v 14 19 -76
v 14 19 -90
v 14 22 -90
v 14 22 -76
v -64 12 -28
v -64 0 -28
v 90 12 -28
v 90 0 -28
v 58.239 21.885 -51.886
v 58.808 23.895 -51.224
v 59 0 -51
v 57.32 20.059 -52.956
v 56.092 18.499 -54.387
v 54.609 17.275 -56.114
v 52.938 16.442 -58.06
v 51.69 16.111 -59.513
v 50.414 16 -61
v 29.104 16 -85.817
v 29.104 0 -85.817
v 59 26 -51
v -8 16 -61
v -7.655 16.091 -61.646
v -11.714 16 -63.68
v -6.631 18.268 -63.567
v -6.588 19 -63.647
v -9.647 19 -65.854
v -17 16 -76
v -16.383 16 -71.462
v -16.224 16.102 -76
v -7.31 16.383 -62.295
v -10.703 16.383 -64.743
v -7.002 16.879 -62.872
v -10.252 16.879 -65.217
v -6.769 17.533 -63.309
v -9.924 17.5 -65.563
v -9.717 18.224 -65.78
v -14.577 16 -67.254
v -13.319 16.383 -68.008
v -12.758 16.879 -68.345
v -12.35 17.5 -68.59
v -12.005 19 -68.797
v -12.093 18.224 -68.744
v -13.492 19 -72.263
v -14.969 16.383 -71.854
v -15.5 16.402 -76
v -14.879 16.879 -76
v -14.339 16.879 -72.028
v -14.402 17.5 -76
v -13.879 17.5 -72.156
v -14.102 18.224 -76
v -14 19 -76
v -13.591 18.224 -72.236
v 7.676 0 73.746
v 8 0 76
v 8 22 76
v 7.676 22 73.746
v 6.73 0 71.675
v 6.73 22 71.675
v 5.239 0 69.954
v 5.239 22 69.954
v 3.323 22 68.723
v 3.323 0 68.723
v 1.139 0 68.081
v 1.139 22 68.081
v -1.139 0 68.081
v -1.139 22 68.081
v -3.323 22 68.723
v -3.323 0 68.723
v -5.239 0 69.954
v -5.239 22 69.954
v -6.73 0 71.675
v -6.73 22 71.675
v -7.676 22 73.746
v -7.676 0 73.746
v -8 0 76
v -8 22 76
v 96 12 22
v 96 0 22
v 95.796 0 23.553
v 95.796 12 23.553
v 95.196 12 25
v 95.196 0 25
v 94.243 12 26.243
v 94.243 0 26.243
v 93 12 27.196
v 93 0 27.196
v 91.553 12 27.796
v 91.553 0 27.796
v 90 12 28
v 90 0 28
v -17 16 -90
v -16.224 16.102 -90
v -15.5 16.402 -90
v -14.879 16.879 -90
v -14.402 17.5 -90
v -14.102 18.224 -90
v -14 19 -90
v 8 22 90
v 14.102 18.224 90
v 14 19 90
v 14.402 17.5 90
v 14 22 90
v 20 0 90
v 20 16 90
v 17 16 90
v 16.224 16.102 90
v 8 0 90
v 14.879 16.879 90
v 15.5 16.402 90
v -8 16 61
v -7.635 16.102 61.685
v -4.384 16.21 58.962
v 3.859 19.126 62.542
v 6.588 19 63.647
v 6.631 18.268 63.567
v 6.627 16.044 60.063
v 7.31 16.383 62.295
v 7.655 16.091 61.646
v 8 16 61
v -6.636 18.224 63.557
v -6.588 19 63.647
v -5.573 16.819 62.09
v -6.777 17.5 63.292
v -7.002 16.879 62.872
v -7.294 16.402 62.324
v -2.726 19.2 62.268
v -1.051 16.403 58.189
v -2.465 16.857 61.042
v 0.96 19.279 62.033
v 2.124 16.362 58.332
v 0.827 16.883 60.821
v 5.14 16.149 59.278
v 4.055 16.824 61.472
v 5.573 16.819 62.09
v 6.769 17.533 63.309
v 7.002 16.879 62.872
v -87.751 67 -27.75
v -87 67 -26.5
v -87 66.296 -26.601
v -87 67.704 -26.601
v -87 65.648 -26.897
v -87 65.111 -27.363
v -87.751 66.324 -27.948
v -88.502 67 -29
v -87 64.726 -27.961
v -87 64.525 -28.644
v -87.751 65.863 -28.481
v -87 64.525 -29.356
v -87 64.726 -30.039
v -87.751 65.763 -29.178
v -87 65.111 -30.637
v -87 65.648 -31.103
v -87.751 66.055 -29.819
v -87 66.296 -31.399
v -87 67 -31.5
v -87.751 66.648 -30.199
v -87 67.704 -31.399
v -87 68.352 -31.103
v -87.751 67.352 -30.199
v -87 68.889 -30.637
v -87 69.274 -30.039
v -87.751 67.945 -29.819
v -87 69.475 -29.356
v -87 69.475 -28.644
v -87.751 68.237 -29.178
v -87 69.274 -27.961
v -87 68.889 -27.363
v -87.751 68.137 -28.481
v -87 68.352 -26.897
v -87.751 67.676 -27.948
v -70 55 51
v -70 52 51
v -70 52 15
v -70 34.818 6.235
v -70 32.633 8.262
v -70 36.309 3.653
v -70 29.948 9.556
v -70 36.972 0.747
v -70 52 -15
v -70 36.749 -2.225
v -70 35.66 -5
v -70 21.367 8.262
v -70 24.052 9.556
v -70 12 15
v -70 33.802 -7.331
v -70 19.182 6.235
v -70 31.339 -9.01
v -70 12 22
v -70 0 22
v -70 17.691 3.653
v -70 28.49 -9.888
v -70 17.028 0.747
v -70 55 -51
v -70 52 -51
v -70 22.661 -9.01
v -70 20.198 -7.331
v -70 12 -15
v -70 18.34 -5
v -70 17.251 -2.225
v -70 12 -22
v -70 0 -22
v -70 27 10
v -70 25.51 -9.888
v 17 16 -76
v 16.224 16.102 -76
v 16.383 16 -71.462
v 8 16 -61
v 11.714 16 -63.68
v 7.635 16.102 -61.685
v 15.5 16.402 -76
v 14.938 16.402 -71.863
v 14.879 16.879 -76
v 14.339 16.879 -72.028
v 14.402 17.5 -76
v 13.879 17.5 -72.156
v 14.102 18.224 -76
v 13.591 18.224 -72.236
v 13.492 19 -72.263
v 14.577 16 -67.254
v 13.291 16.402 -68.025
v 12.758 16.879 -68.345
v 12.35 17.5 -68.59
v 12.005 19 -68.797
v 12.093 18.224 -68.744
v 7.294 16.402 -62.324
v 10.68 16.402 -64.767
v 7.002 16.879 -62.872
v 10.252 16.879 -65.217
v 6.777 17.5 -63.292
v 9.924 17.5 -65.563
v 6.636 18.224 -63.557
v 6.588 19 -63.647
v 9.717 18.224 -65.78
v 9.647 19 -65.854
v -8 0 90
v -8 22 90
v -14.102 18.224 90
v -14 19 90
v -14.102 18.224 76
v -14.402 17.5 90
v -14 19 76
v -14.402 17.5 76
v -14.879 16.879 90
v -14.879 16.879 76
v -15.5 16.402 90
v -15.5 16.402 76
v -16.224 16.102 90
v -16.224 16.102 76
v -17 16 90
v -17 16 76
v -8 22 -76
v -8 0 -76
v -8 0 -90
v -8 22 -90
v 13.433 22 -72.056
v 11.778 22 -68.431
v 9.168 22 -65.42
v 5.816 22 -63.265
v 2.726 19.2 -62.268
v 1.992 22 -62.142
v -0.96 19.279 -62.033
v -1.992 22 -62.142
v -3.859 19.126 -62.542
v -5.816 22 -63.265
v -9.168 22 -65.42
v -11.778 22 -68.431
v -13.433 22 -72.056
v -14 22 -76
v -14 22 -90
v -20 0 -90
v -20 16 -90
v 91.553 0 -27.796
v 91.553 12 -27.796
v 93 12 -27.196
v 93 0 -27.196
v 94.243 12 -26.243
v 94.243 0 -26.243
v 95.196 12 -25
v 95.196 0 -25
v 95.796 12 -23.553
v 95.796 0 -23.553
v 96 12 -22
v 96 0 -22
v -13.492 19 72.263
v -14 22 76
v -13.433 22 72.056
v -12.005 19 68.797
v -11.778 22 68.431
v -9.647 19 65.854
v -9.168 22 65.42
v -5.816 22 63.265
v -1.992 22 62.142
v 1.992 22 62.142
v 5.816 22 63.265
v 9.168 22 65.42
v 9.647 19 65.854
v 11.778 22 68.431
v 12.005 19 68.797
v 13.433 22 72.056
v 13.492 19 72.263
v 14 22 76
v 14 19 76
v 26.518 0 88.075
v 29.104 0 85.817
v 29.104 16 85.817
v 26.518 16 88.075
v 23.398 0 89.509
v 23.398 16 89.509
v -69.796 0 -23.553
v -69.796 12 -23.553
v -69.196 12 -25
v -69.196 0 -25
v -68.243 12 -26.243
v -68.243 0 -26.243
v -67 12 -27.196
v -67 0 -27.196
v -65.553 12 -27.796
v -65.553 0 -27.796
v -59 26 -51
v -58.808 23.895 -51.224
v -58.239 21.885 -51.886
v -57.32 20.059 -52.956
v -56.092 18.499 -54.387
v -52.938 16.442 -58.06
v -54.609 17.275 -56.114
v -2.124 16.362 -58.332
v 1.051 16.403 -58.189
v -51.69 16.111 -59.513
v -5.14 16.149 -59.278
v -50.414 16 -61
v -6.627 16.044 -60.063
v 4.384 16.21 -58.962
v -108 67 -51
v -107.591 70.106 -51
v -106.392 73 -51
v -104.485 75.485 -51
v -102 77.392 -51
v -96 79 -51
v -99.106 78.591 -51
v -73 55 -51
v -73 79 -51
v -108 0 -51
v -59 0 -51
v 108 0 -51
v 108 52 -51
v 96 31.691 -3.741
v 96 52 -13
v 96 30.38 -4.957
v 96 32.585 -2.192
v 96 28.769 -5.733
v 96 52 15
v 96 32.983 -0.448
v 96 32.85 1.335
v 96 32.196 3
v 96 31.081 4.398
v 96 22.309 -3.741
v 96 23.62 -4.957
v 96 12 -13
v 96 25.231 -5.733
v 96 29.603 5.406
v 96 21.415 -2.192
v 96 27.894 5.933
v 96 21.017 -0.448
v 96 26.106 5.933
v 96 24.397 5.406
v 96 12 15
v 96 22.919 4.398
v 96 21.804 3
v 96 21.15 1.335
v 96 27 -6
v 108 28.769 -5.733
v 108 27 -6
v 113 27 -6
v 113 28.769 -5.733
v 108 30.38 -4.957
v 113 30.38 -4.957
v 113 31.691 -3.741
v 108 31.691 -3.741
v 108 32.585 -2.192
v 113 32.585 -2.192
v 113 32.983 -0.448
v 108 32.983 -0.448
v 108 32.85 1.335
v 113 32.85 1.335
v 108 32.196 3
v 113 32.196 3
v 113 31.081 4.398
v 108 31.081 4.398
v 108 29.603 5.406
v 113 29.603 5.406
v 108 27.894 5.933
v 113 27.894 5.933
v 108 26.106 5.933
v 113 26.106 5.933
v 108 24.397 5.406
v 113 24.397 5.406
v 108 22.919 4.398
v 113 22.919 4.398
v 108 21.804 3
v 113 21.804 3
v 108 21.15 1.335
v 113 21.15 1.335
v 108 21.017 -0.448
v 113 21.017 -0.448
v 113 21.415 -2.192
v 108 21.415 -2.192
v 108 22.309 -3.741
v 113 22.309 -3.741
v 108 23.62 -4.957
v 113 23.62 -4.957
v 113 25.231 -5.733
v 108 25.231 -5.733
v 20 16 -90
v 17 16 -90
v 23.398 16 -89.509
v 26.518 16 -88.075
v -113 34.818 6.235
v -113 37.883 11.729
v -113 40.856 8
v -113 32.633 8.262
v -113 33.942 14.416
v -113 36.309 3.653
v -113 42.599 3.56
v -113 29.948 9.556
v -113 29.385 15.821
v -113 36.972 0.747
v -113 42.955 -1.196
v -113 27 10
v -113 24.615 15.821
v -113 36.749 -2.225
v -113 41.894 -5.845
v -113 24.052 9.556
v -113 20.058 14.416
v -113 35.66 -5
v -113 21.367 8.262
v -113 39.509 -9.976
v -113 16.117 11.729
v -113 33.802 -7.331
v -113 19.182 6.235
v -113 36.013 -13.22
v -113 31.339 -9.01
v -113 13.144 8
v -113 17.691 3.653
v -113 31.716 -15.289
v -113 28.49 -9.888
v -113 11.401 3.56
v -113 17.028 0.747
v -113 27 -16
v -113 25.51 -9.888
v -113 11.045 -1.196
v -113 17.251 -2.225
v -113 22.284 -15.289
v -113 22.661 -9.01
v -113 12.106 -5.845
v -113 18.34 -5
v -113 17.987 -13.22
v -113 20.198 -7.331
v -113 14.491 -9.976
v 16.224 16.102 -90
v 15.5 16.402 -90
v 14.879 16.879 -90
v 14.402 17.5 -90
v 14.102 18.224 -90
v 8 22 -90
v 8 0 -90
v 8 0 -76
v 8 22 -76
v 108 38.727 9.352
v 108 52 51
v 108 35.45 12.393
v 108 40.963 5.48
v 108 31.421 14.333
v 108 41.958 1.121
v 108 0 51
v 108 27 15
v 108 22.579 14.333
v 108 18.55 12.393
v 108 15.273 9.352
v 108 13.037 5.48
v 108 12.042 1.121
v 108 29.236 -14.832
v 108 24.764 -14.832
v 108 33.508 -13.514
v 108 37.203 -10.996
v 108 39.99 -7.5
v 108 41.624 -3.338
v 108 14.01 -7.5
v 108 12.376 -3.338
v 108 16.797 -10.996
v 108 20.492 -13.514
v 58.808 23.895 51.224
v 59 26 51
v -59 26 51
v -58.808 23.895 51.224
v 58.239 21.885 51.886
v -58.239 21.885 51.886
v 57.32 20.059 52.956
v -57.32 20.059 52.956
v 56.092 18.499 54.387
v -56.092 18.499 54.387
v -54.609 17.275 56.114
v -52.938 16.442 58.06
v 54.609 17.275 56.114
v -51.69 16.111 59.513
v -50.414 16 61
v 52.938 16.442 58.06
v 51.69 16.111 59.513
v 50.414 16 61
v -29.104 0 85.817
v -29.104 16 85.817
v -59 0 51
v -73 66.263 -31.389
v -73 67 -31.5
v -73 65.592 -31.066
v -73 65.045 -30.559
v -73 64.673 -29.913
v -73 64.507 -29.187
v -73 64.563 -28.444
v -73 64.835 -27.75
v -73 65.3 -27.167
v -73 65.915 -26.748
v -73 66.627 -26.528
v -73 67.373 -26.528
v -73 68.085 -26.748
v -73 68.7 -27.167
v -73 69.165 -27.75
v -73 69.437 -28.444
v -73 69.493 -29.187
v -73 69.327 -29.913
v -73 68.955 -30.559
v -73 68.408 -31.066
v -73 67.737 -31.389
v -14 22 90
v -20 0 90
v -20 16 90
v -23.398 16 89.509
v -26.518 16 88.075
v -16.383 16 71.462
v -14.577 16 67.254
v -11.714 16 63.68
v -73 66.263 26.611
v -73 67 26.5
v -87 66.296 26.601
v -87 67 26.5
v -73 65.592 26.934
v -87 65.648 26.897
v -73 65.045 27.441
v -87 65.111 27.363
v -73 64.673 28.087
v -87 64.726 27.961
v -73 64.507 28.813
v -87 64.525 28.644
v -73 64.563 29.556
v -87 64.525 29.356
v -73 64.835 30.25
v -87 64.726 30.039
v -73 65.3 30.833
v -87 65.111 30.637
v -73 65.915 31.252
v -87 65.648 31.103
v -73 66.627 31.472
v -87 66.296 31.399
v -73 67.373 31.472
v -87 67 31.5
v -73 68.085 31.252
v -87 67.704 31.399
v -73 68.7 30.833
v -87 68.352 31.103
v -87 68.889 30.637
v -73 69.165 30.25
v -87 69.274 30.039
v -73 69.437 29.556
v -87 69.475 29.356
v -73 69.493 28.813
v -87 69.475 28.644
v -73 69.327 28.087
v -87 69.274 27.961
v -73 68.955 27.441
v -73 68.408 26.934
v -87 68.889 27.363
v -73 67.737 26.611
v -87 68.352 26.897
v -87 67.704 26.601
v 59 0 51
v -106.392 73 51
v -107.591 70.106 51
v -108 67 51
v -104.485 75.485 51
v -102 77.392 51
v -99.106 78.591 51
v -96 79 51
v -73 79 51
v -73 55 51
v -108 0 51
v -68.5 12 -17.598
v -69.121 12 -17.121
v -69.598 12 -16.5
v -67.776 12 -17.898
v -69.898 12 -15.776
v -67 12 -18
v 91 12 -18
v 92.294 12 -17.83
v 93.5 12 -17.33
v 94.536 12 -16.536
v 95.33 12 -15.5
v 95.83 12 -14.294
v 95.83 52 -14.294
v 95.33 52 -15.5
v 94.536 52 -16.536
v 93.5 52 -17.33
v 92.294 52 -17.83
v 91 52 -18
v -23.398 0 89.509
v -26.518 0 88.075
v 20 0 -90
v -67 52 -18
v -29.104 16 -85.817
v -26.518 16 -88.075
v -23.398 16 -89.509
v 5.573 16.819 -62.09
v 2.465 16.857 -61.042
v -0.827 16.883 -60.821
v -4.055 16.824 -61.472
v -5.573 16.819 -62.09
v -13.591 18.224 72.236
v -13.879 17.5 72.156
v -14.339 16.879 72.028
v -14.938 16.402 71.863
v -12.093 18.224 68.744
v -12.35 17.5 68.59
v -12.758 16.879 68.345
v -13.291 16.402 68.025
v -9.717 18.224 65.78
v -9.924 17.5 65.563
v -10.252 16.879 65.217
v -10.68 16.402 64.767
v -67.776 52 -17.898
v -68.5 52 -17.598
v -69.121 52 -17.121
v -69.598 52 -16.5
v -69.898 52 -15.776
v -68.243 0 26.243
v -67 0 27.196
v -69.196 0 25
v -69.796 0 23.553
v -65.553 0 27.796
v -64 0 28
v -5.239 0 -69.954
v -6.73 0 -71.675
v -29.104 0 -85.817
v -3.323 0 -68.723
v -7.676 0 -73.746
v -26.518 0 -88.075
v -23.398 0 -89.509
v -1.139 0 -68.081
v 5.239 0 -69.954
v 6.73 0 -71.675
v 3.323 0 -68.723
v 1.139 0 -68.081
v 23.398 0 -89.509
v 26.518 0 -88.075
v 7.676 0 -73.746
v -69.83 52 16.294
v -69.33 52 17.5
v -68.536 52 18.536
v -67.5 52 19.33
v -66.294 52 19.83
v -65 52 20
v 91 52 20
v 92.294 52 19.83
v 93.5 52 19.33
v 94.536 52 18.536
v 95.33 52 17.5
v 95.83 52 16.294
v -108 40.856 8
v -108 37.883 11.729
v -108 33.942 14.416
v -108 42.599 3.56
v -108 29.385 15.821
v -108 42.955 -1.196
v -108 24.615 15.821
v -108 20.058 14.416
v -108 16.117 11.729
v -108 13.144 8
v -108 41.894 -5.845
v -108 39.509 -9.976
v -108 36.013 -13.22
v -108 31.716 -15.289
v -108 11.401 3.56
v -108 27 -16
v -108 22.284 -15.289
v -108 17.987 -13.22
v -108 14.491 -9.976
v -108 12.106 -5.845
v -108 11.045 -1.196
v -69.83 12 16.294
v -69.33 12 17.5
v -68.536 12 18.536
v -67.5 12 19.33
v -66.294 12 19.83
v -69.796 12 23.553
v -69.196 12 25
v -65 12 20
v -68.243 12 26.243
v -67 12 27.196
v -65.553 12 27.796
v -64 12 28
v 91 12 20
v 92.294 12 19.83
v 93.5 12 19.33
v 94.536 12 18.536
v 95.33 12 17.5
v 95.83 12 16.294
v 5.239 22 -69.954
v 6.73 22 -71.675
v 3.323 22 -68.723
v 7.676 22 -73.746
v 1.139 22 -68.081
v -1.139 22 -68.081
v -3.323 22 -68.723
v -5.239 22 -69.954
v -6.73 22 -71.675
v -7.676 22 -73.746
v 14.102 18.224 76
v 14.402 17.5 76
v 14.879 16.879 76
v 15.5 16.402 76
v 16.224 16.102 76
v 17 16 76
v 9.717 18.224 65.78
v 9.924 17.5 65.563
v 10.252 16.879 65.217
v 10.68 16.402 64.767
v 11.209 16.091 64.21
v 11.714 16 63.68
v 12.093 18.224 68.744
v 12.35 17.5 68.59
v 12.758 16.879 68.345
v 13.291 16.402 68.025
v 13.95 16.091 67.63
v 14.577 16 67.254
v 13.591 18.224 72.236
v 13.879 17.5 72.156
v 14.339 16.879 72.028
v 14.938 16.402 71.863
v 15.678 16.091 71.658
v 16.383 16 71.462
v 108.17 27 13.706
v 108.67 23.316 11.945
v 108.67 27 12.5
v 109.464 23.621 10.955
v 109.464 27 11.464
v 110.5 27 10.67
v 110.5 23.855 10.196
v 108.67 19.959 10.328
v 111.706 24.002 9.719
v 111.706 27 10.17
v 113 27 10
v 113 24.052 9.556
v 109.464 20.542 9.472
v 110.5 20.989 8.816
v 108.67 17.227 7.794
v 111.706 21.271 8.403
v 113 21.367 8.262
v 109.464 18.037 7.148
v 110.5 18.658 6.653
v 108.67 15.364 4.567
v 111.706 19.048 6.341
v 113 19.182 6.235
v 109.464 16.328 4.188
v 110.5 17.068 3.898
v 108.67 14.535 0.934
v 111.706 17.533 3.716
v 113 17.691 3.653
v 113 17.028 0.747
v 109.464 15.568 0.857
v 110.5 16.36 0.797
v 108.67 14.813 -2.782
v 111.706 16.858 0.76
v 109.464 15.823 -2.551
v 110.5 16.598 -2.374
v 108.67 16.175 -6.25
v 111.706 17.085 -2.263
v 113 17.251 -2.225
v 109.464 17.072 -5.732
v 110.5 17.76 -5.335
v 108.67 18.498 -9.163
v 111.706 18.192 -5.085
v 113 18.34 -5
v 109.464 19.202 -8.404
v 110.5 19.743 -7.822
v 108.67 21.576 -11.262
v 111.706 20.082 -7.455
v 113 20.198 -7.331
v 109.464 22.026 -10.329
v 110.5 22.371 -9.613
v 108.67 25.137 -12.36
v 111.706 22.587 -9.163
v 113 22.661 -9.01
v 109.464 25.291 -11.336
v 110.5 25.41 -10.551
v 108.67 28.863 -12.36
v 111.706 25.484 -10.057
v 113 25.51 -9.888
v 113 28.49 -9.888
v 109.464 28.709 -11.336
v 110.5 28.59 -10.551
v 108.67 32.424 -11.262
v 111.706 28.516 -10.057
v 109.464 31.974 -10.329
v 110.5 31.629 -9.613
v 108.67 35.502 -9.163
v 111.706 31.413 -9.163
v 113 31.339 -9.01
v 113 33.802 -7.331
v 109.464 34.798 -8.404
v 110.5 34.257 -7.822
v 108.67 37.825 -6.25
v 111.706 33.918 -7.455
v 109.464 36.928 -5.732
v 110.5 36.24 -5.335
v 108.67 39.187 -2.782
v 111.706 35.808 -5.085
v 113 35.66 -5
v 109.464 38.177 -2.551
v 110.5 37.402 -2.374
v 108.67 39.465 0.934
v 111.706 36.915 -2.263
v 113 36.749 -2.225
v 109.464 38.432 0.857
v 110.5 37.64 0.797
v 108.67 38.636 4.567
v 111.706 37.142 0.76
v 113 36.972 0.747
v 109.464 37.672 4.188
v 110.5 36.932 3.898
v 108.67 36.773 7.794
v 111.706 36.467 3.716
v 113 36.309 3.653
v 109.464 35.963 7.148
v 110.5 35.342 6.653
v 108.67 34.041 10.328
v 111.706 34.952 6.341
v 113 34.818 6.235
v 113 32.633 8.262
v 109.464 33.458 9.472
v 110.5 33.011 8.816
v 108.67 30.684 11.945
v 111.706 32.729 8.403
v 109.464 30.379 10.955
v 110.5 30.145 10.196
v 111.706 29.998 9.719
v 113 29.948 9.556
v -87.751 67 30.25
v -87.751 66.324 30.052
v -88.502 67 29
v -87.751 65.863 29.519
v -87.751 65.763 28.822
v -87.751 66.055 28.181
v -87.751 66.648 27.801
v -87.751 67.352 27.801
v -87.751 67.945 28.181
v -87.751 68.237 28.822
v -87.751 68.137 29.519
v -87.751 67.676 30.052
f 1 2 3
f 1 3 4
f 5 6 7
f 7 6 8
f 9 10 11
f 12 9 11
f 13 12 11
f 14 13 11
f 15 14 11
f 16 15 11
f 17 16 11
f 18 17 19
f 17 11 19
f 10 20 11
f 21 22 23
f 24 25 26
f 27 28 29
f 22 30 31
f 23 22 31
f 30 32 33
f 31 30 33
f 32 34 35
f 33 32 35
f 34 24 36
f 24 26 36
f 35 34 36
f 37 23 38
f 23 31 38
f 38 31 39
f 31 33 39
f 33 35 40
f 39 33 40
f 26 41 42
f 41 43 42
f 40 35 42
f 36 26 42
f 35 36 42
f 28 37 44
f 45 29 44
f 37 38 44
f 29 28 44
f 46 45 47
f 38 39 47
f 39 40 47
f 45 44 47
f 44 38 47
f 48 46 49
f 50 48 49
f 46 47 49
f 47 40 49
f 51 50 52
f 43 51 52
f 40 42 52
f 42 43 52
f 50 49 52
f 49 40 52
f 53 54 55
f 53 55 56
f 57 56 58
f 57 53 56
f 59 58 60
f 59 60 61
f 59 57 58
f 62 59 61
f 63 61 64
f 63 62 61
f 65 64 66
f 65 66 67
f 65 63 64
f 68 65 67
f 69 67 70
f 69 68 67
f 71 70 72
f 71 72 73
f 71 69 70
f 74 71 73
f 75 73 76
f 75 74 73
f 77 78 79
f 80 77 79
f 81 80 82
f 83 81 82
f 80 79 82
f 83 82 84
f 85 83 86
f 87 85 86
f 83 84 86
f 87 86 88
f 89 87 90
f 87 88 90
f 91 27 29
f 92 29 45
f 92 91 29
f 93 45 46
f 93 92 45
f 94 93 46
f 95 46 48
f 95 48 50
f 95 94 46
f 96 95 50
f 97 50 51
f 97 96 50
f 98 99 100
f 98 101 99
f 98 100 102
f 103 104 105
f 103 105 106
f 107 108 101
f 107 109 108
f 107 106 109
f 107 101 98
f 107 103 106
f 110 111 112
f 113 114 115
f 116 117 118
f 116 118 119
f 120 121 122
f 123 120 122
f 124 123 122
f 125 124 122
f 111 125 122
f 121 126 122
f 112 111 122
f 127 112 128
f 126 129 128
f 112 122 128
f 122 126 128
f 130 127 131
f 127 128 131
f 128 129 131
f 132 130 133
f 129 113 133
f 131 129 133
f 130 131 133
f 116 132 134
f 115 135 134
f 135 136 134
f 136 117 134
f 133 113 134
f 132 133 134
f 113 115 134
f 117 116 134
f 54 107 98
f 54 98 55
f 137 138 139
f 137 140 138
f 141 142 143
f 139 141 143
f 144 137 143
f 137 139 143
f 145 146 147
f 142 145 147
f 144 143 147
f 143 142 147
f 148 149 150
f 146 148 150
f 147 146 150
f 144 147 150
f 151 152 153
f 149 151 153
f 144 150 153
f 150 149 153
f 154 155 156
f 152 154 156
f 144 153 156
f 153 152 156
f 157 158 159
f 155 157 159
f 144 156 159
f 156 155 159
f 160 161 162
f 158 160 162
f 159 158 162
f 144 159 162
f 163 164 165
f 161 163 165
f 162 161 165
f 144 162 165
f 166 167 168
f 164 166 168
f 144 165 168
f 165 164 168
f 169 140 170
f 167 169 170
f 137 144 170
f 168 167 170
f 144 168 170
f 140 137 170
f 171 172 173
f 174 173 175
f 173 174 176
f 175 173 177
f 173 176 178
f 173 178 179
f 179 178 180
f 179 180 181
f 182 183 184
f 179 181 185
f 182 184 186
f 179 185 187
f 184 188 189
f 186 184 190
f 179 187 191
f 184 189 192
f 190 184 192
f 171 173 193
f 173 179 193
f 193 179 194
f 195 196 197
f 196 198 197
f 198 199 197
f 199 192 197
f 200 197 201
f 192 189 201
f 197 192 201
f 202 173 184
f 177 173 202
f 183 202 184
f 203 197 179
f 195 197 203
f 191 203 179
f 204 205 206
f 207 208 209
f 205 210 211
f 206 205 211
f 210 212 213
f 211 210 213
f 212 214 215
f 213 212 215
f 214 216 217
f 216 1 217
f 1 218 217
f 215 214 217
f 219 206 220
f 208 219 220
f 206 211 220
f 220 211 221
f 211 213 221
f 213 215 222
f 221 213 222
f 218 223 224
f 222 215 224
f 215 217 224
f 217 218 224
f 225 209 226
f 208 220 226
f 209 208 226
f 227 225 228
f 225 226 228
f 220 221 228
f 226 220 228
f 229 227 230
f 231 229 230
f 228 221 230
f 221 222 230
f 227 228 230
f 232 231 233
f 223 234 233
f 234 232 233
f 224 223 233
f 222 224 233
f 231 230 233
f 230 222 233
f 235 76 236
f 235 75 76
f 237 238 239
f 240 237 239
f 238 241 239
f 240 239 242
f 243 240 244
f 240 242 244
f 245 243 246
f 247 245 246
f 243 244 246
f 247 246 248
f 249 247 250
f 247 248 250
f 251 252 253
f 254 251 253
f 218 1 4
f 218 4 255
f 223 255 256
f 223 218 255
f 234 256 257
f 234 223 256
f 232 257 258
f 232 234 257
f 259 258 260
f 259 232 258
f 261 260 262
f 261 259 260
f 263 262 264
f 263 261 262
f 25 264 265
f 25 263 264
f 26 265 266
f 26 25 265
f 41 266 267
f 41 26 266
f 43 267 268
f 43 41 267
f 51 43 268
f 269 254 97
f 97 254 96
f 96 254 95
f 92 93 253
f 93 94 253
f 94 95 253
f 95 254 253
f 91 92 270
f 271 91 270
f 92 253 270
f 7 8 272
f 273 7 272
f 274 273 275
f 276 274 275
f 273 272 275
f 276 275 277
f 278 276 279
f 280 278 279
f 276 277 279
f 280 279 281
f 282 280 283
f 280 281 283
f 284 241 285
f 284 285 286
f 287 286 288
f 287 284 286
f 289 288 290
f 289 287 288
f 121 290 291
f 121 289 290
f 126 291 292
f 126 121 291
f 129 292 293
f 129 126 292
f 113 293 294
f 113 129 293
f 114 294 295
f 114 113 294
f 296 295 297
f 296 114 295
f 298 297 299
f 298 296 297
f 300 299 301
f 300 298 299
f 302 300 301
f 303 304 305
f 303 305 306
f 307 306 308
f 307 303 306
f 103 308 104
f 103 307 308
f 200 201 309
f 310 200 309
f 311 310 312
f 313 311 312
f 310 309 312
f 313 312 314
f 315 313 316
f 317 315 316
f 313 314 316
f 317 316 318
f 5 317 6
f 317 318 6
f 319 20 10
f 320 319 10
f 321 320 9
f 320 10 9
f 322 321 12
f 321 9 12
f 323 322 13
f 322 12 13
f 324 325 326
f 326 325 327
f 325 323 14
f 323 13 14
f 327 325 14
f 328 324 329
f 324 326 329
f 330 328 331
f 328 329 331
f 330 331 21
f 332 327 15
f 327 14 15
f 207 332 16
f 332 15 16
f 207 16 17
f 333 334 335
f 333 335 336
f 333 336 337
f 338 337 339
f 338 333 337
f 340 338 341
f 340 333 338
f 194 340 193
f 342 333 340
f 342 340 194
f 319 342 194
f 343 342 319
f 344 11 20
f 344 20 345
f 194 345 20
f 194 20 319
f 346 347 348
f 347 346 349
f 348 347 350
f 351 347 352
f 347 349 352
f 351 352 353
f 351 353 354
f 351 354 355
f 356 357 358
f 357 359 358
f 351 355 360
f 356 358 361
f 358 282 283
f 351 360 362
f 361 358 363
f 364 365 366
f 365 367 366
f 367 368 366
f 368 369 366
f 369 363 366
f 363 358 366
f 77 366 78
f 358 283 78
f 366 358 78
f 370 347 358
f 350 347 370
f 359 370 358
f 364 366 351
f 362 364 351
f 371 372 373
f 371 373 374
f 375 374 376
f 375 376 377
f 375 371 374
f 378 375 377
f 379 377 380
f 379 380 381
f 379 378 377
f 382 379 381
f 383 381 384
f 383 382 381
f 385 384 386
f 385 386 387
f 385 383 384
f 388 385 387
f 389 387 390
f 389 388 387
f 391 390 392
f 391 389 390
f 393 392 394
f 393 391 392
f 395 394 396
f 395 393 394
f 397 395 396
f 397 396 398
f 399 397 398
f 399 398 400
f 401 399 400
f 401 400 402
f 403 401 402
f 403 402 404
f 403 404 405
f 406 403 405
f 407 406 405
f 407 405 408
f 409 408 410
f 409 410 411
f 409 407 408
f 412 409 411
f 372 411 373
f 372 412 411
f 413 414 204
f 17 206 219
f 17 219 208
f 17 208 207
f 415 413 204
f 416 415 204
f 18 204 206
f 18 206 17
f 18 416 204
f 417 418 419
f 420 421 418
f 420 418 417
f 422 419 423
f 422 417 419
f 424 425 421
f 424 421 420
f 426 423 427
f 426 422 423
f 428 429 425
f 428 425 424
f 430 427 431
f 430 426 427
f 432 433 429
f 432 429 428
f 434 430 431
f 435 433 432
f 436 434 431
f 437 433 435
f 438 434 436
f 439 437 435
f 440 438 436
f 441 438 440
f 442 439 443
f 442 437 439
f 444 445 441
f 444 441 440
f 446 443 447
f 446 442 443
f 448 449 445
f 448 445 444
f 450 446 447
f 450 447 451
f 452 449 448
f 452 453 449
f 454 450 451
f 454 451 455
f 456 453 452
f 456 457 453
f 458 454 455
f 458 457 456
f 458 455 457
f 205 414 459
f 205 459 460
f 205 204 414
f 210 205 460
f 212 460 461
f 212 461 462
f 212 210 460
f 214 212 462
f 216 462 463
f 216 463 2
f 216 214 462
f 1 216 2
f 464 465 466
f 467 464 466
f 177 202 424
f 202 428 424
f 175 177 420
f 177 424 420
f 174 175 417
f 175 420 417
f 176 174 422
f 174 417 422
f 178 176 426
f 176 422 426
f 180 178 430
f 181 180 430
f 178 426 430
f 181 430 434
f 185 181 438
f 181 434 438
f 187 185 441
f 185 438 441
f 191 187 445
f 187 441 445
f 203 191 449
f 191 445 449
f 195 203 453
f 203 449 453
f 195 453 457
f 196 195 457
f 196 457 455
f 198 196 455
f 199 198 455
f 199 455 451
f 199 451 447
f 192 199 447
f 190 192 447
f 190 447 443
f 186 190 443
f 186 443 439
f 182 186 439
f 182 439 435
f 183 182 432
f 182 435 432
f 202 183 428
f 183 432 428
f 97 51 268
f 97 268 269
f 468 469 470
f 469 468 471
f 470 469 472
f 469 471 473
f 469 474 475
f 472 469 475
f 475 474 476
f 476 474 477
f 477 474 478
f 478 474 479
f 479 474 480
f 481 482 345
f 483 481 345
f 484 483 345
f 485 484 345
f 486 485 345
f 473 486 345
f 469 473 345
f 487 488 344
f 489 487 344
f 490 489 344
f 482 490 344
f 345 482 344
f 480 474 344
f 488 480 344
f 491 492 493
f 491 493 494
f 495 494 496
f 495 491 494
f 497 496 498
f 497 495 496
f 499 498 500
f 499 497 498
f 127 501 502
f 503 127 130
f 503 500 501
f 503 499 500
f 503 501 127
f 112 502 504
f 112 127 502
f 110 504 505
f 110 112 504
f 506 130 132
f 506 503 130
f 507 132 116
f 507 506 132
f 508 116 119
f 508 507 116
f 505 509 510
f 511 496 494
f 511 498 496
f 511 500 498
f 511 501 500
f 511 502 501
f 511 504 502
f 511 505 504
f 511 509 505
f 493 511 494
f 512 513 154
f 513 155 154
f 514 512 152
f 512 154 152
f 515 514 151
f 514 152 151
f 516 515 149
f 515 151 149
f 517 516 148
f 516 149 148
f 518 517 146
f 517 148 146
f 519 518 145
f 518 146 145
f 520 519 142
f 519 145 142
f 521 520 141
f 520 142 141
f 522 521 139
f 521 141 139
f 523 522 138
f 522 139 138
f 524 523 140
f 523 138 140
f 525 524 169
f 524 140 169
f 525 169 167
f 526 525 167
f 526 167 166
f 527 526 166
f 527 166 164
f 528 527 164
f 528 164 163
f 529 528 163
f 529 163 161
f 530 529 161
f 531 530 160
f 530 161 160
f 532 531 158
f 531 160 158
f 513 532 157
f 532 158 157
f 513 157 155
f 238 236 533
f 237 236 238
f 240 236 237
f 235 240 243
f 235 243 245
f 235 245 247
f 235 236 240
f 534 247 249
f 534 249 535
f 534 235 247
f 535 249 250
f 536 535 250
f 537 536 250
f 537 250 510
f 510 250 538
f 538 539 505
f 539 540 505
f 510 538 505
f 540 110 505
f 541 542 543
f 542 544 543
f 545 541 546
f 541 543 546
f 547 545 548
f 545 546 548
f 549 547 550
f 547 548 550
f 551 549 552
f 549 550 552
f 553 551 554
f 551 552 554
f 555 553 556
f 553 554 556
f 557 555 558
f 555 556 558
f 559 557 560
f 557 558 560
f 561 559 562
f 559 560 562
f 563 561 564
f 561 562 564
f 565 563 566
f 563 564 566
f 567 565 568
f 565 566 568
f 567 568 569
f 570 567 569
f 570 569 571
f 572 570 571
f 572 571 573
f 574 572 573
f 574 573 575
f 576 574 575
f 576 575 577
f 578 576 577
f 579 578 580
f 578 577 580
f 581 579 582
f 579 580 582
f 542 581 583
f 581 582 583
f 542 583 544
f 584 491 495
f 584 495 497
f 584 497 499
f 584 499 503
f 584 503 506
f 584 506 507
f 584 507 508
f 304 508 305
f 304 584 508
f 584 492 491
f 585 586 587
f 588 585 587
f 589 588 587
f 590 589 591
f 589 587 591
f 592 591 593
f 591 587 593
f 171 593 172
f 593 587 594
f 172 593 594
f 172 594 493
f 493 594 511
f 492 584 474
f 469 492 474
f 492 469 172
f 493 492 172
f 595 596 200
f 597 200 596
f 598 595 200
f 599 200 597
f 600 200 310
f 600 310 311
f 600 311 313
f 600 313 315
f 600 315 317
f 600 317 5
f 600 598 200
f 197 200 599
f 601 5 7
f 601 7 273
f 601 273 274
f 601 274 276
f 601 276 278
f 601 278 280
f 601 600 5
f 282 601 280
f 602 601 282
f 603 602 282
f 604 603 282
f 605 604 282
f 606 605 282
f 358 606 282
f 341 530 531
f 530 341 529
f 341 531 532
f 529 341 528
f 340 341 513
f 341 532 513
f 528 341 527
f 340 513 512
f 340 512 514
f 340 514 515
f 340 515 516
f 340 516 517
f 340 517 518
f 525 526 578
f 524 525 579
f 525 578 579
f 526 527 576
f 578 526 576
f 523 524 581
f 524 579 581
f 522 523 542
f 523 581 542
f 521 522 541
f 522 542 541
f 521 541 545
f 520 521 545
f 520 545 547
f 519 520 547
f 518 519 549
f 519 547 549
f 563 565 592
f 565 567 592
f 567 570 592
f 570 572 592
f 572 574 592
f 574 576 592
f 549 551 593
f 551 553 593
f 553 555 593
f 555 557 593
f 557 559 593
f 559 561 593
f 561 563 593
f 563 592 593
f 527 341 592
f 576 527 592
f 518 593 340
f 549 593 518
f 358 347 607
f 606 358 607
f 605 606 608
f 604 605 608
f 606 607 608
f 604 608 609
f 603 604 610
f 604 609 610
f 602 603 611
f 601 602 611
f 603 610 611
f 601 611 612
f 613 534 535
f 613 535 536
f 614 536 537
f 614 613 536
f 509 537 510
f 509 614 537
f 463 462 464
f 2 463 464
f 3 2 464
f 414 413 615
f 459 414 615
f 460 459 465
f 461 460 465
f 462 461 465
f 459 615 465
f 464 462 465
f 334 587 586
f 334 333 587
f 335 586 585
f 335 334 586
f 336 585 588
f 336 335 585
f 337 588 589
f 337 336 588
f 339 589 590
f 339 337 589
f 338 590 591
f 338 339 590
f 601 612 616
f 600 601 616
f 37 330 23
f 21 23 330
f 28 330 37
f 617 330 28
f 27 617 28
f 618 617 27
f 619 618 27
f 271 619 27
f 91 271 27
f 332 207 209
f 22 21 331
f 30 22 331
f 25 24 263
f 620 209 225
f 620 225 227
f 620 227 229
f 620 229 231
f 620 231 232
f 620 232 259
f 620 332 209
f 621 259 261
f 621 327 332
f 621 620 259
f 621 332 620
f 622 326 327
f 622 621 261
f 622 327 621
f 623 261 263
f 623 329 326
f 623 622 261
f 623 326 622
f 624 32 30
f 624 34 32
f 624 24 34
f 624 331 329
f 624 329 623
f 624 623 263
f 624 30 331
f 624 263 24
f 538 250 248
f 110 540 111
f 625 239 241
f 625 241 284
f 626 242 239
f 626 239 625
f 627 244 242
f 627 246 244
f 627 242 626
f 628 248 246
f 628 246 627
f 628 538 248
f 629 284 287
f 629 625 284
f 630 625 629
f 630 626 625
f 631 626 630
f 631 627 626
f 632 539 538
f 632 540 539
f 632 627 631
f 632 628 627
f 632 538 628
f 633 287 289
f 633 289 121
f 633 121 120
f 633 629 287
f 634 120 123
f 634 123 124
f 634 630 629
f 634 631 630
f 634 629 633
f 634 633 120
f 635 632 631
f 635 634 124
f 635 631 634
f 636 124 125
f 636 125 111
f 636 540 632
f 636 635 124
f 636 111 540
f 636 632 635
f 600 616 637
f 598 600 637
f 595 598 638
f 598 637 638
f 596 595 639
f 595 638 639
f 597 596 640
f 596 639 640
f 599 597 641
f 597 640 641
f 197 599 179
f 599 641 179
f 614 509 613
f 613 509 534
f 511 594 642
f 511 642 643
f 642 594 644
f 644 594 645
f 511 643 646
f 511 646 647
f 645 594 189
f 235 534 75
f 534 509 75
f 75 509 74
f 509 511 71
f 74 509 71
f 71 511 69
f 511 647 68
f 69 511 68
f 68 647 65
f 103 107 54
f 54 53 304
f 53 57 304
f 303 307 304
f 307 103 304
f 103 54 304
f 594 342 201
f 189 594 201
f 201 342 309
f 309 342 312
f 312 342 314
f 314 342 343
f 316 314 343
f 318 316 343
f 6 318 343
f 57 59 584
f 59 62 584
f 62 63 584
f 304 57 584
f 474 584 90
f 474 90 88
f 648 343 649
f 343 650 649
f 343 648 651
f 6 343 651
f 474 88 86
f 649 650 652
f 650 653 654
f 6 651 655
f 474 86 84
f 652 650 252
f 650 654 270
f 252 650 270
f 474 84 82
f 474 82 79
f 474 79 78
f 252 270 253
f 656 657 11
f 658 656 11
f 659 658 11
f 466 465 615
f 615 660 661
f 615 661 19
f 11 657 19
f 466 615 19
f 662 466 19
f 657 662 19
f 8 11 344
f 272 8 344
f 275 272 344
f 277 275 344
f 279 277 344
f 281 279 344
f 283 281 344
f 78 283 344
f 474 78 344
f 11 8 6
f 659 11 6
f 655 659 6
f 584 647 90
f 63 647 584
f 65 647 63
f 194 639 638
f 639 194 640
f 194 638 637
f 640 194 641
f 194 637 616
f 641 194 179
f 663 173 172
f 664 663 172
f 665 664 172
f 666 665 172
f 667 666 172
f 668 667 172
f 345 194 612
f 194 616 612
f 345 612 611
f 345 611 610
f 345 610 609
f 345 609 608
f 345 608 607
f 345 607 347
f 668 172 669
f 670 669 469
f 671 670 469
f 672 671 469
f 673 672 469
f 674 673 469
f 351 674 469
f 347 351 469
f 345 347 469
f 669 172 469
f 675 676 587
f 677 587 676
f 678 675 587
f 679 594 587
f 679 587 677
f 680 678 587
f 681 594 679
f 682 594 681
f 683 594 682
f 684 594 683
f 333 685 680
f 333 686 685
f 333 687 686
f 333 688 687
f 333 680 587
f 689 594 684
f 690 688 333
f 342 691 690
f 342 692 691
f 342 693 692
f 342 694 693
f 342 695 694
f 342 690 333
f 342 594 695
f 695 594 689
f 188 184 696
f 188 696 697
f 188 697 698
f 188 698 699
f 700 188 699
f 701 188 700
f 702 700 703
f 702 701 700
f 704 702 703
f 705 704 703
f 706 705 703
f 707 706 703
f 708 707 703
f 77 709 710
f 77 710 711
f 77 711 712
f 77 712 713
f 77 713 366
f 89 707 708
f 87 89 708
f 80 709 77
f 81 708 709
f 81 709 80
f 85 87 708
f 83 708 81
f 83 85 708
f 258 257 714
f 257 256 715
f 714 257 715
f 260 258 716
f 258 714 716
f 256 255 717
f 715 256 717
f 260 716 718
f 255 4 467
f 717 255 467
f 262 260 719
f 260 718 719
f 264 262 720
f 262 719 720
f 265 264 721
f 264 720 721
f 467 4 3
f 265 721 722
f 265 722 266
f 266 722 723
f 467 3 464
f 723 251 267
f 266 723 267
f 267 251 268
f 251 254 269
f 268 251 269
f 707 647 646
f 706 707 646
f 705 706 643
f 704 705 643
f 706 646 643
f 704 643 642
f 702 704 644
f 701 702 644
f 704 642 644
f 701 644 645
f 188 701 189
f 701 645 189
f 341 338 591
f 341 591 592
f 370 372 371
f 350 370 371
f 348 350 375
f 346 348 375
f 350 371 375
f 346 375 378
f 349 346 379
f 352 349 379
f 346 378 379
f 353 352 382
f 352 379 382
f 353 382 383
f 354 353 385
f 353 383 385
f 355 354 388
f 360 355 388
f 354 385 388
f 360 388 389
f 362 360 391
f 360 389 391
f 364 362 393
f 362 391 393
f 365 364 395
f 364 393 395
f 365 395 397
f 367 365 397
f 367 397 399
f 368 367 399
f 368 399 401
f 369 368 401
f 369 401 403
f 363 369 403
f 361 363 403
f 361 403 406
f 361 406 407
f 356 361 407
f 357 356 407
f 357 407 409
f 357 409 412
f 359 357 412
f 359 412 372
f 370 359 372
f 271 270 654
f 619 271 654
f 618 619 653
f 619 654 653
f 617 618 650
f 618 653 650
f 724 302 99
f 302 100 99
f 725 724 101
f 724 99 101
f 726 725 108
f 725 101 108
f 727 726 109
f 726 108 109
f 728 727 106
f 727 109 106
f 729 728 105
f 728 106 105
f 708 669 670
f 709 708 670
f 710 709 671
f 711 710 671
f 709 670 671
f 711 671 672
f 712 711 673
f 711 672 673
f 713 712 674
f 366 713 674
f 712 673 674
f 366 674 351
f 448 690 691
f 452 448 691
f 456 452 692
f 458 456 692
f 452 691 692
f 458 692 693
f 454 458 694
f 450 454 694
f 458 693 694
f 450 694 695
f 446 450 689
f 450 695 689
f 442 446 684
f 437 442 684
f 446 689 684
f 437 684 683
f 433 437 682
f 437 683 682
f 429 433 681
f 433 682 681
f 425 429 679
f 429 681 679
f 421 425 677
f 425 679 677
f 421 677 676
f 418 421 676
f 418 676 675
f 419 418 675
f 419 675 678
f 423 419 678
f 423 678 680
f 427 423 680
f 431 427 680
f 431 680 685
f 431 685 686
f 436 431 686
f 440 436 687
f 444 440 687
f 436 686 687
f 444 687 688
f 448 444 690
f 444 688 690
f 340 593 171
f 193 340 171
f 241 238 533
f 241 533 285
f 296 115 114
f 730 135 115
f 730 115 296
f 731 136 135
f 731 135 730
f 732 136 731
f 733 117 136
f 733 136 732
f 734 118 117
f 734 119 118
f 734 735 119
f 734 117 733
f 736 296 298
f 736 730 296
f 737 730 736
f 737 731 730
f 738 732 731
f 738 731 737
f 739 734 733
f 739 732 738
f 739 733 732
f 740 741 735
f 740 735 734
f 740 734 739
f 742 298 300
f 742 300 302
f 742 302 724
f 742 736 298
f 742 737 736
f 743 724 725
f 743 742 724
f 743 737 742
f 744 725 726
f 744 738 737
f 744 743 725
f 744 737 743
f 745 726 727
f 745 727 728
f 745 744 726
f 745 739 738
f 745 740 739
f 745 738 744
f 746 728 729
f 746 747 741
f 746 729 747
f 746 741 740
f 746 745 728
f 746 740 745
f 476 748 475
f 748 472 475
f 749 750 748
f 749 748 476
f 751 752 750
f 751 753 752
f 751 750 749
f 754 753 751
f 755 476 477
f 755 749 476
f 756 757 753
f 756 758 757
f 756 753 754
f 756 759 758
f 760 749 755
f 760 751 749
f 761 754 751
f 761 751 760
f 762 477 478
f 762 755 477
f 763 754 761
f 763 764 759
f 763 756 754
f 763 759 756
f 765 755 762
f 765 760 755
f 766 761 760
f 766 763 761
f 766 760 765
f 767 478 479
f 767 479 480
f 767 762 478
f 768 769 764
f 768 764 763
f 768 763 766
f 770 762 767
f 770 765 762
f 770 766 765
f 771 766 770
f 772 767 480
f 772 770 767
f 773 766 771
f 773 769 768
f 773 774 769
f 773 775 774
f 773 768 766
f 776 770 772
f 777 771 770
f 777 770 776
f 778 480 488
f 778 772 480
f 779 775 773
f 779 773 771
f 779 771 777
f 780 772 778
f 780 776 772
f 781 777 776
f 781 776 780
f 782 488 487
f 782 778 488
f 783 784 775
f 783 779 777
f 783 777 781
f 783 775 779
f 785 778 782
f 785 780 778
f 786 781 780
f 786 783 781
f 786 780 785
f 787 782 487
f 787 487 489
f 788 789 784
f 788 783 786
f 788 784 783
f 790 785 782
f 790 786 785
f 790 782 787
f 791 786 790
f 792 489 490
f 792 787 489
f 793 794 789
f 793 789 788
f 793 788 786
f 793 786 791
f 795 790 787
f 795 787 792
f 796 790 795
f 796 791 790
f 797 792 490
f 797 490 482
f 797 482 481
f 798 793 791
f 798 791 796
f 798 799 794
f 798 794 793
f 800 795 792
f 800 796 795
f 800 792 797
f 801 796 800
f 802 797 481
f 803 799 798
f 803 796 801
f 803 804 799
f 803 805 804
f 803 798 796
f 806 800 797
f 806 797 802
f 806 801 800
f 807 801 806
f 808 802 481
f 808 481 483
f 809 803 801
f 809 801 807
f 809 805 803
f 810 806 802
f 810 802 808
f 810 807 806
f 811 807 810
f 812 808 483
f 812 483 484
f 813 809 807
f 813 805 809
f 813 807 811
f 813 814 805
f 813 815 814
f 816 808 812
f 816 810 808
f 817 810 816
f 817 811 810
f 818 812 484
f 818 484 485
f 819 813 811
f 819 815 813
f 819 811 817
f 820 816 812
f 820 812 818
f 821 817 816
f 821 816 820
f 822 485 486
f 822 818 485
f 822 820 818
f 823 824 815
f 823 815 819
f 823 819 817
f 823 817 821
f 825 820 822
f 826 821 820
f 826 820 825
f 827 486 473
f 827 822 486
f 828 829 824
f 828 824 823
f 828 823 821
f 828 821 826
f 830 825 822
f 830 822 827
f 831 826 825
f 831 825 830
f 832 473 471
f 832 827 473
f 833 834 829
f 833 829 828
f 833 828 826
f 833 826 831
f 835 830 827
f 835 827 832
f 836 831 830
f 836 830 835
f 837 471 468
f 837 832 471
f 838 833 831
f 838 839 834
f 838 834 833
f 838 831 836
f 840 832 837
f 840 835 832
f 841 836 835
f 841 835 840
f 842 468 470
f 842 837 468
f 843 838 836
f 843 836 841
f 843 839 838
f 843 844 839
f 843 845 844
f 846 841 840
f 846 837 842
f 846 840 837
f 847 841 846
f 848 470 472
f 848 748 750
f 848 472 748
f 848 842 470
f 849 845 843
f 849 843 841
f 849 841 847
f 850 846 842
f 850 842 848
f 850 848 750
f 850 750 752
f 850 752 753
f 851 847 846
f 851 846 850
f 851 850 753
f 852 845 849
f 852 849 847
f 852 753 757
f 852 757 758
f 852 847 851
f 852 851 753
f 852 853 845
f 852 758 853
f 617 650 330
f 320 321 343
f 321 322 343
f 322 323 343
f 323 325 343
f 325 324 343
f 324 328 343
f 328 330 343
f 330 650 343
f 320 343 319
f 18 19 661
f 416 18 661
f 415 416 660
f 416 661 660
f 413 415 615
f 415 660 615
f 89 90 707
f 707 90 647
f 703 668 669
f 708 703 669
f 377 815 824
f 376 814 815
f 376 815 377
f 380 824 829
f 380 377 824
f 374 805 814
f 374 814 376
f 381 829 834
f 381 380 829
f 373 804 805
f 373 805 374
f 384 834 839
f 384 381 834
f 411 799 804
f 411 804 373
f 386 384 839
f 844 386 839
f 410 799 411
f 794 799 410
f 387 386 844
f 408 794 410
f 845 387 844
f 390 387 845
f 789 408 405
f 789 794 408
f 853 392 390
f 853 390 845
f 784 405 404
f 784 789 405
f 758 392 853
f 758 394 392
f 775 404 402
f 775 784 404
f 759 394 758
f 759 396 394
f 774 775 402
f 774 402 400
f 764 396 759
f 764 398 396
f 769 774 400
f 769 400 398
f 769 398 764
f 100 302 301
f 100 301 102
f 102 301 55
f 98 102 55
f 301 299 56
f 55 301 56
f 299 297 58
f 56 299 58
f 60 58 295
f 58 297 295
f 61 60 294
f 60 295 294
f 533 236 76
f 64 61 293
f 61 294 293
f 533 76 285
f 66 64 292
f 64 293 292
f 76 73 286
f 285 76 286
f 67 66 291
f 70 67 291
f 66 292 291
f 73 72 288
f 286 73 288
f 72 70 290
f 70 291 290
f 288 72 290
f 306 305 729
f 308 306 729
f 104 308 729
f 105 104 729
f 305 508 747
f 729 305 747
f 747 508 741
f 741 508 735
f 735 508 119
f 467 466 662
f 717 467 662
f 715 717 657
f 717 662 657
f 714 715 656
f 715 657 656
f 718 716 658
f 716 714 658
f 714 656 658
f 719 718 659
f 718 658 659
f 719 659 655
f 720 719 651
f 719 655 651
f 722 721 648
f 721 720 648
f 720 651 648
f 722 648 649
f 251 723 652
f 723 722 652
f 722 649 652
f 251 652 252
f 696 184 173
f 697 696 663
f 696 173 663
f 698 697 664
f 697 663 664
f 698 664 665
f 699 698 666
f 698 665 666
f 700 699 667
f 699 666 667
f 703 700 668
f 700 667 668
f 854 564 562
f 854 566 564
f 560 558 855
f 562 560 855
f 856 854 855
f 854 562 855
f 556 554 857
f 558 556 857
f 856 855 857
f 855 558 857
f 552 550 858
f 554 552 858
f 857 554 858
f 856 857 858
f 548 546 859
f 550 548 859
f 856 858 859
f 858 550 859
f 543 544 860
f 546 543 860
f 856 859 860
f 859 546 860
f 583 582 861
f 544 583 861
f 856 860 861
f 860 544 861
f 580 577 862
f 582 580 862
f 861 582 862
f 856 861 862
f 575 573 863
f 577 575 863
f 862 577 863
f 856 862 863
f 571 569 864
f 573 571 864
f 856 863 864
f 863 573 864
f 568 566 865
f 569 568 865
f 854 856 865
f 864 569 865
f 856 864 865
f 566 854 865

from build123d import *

# Parameters (mm, degrees)
SKETCH1_W             = 216
SKETCH1_H             = 102
EXTRUDE1_DEPTH        = 79
EXTRUDE2_DEPTH        = 169.25278601
FILLET1_R             = 12
EXTRUDE3_DEPTH        = 131.265114286
EXTRUDE4_DEPTH        = 16
EXTRUDE5_DEPTH        = 6
FILLET3_R             = 10
FILLET4_R             = 3
FILLET5_R             = 10
FILLET6_R             = 3
M6_TAPPED_HOLE1_D     = 5
M6_TAPPED_HOLE1_DEPTH = 14
M6_TAPPED_HOLE1_TIP   = 1.502151548
SKETCH13_R            = 10
SKETCH13_R_2          = 6
EXTRUDE7_DEPTH        = 5
EXTRUDE8_REACH        = 248.976
SKETCH14_R            = 6
FILLET7_R             = 5
SKETCH15_R            = 16
EXTRUDE9_DEPTH        = 5
EXTRUDE10_REACH       = 257.767
SKETCH16_R            = 10
EXTRUDE11_DEPTH       = 12


with BuildPart() as part:
    # Sketch1 → Extrude1 (new body)
    with BuildSketch(Plane(origin=(0, 0, 0), x_dir=(1, 0, 0), z_dir=(0, 1, 0))):
        Rectangle(SKETCH1_W, SKETCH1_H)
    extrude(amount=EXTRUDE1_DEPTH)

    # Sketch2 → Extrude2 (cut, through all)
    with BuildSketch(Plane.XY.offset(51)):
        Polygon((-73, 79), (-73, 55), (-70, 55), (-70, 52), (108, 52), (108, 79), align=None)
    extrude(amount=-EXTRUDE2_DEPTH, mode=Mode.SUBTRACT)

    # Fillet1
    fillet1_edges = [part.edges().sort_by_distance(p)[0] for p in [
        (-108, 79, 0),
    ]]
    fillet(fillet1_edges, radius=FILLET1_R)

    # Sketch3 → Extrude3 (cut, through all)
    with BuildSketch(Plane(origin=(0, 52, 0), x_dir=(1, 0, 0), z_dir=(0, 1, 0))):
        with BuildLine():
            Line((-65, -20), (91, -20))
            ThreePointArc((91, -20), (94.535533906, -18.535533906), (96, -15))
            Line((96, -15), (96, 13))
            ThreePointArc((96, 13), (94.535533906, 16.535533906), (91, 18))
            Line((91, 18), (-67, 18))
            ThreePointArc((-67, 18), (-69.121320344, 17.121320344), (-70, 15))
            Line((-70, 15), (-70, -15))
            ThreePointArc((-70, -15), (-68.535533906, -18.535533906), (-65, -20))
        make_face()
    extrude(amount=-EXTRUDE3_DEPTH, mode=Mode.SUBTRACT)

    # Sketch4 → Extrude4 (add)
    with BuildSketch(Plane(origin=(0, 0, 0), x_dir=(1, 0, 0), z_dir=(0, 1, 0))):
        with BuildLine():
            Line((-8, 90), (-20, 90))
            ThreePointArc((-20, 90), (-25.00957212, 88.904319657), (-29.10432929, 85.817364529))
            Line((-29.10432929, 85.817364529), (-59, 51))
            Line((-59, 51), (59, 51))
            Line((59, 51), (29.10432929, 85.817364529))
            ThreePointArc((29.10432929, 85.817364529), (25.00957212, 88.904319657), (20, 90))
            Line((20, 90), (8, 90))
            Line((8, 90), (8, 76))
            ThreePointArc((8, 76), (0, 68), (-8, 76))
            Line((-8, 76), (-8, 90))
        make_face()
        with BuildLine():
            Line((8, -90), (8, -76))
            ThreePointArc((8, -76), (0, -68), (-8, -76))
            Line((-8, -76), (-8, -90))
            Line((-8, -90), (-20, -90))
            ThreePointArc((-20, -90), (-25.00957212, -88.904319657), (-29.10432929, -85.817364529))
            Line((-29.10432929, -85.817364529), (-59, -51))
            Line((-59, -51), (59, -51))
            Line((59, -51), (29.10432929, -85.817364529))
            ThreePointArc((29.10432929, -85.817364529), (25.00957212, -88.904319657), (20, -90))
            Line((20, -90), (8, -90))
        make_face()
    extrude(amount=EXTRUDE4_DEPTH)

    # Sketch5 → Extrude5 (add)
    with BuildSketch(Plane(origin=(0, 16, 0), x_dir=(1, 0, 0), z_dir=(0, 1, 0))):
        with BuildLine():
            Line((-14, -90), (-14, -76))
            ThreePointArc((-14, -76), (0, -62), (14, -76))
            Line((14, -76), (14, -90))
            Line((14, -90), (8, -90))
            Line((8, -90), (8, -76))
            ThreePointArc((8, -76), (0, -68), (-8, -76))
            Line((-8, -76), (-8, -90))
            Line((-8, -90), (-14, -90))
        make_face()
        with BuildLine():
            Line((14, 90), (14, 76))
            ThreePointArc((14, 76), (0, 62), (-14, 76))
            Line((-14, 76), (-14, 90))
            Line((-14, 90), (-8, 90))
            Line((-8, 90), (-8, 76))
            ThreePointArc((-8, 76), (0, 68), (8, 76))
            Line((8, 76), (8, 90))
            Line((8, 90), (14, 90))
        make_face()
    extrude(amount=EXTRUDE5_DEPTH)

    # Fillet3
    fillet3_edges = [part.edges().sort_by_distance(p)[0] for p in [
        (0, 16, 51),
    ]]
    fillet(fillet3_edges, radius=FILLET3_R)

    # Fillet4
    fillet4_edges = [part.edges().sort_by_distance(p)[0] for p in [
        (14, 16, 83),
        (0, 16, 62),
        (-14, 16, 83),
    ]]
    fillet(fillet4_edges, radius=FILLET4_R)

    # Fillet5
    fillet5_edges = [part.edges().sort_by_distance(p)[0] for p in [
        (0, 16, -51),
    ]]
    fillet(fillet5_edges, radius=FILLET5_R)

    # Fillet6
    fillet6_edges = [part.edges().sort_by_distance(p)[0] for p in [
        (0, 16, -62),
        (14, 16, -83),
        (-14, 16, -83),
    ]]
    fillet(fillet6_edges, radius=FILLET6_R)

    # M6 Tapped Hole1
    with Locations(Plane(origin=(-73, 67, 29), x_dir=(0, 0, 1), z_dir=(1, 0, 0))):
        with Locations((0, 0), (-58, 0)):
            Hole(M6_TAPPED_HOLE1_D / 2, depth=M6_TAPPED_HOLE1_DEPTH)
            with Locations((0, 0, -(M6_TAPPED_HOLE1_DEPTH + M6_TAPPED_HOLE1_TIP / 2))):  # 118° drill point
                Cone(0, M6_TAPPED_HOLE1_D / 2, M6_TAPPED_HOLE1_TIP, mode=Mode.SUBTRACT)

    # Sketch13 → Extrude7 (add)
    with BuildSketch(Plane(origin=(108, 0, 0), x_dir=(0, 0, -1), z_dir=(1, 0, 0))):
        with Locations(Location((0, 27, 0), (0, 0, 180))):
            Circle(SKETCH13_R)
        with Locations((0, 27)):
            Circle(SKETCH13_R_2, mode=Mode.SUBTRACT)
    extrude(amount=EXTRUDE7_DEPTH)

    # Sketch14 → Extrude8 (cut, up to next)
    with BuildSketch(Plane(origin=(108, 0, 0), x_dir=(0, 0, -1), z_dir=(1, 0, 0)), mode=Mode.PRIVATE) as extrude8_sk1:
        with Locations((0, 27)):
            Circle(SKETCH14_R)
    extrude8_tool1 = extrude(extrude8_sk1.sketch, amount=-EXTRUDE8_REACH, mode=Mode.PRIVATE) & part.part
    add(extrude8_tool1.solids().sort_by_distance((108, 27, 0))[0], mode=Mode.SUBTRACT)

    # Fillet7
    fillet7_edges = [part.edges().sort_by_distance(p)[0] for p in [
        (108, 27, -10),
    ]]
    fillet(fillet7_edges, radius=FILLET7_R - 0.0001)  # a hair under: the kernel refuses the full size

    # Sketch15 → Extrude9 (add)
    with BuildSketch(Plane.ZY.offset(108)):
        with Locations(Location((0, 27, 0), (0, 0, 180))):
            Circle(SKETCH15_R)
    extrude(amount=EXTRUDE9_DEPTH)

    # Sketch16 → Extrude10 (cut, up to next)
    with BuildSketch(Plane.ZY.offset(113), mode=Mode.PRIVATE) as extrude10_sk1:
        with Locations((0, 27)):
            Circle(SKETCH16_R)
    extrude10_tool1 = extrude(extrude10_sk1.sketch, amount=-EXTRUDE10_REACH, mode=Mode.PRIVATE) & part.part
    add(extrude10_tool1.solids().sort_by_distance((-113, 27, 0))[0], mode=Mode.SUBTRACT)

    # Sketch17 → Extrude11 (cut)
    with BuildSketch(Plane.XZ):
        with BuildLine():
            Line((-64, -28), (90, -28))
            ThreePointArc((90, -28), (94.242640687, -26.242640687), (96, -22))
            Line((96, -22), (96, 22))
            ThreePointArc((96, 22), (94.242640687, 26.242640687), (90, 28))
            Line((90, 28), (-64, 28))
            ThreePointArc((-64, 28), (-68.242640687, 26.242640687), (-70, 22))
            Line((-70, 22), (-70, -22))
            ThreePointArc((-70, -22), (-68.242640687, -26.242640687), (-64, -28))
        make_face()
    extrude(amount=-EXTRUDE11_DEPTH, mode=Mode.SUBTRACT)


solid = part.part
